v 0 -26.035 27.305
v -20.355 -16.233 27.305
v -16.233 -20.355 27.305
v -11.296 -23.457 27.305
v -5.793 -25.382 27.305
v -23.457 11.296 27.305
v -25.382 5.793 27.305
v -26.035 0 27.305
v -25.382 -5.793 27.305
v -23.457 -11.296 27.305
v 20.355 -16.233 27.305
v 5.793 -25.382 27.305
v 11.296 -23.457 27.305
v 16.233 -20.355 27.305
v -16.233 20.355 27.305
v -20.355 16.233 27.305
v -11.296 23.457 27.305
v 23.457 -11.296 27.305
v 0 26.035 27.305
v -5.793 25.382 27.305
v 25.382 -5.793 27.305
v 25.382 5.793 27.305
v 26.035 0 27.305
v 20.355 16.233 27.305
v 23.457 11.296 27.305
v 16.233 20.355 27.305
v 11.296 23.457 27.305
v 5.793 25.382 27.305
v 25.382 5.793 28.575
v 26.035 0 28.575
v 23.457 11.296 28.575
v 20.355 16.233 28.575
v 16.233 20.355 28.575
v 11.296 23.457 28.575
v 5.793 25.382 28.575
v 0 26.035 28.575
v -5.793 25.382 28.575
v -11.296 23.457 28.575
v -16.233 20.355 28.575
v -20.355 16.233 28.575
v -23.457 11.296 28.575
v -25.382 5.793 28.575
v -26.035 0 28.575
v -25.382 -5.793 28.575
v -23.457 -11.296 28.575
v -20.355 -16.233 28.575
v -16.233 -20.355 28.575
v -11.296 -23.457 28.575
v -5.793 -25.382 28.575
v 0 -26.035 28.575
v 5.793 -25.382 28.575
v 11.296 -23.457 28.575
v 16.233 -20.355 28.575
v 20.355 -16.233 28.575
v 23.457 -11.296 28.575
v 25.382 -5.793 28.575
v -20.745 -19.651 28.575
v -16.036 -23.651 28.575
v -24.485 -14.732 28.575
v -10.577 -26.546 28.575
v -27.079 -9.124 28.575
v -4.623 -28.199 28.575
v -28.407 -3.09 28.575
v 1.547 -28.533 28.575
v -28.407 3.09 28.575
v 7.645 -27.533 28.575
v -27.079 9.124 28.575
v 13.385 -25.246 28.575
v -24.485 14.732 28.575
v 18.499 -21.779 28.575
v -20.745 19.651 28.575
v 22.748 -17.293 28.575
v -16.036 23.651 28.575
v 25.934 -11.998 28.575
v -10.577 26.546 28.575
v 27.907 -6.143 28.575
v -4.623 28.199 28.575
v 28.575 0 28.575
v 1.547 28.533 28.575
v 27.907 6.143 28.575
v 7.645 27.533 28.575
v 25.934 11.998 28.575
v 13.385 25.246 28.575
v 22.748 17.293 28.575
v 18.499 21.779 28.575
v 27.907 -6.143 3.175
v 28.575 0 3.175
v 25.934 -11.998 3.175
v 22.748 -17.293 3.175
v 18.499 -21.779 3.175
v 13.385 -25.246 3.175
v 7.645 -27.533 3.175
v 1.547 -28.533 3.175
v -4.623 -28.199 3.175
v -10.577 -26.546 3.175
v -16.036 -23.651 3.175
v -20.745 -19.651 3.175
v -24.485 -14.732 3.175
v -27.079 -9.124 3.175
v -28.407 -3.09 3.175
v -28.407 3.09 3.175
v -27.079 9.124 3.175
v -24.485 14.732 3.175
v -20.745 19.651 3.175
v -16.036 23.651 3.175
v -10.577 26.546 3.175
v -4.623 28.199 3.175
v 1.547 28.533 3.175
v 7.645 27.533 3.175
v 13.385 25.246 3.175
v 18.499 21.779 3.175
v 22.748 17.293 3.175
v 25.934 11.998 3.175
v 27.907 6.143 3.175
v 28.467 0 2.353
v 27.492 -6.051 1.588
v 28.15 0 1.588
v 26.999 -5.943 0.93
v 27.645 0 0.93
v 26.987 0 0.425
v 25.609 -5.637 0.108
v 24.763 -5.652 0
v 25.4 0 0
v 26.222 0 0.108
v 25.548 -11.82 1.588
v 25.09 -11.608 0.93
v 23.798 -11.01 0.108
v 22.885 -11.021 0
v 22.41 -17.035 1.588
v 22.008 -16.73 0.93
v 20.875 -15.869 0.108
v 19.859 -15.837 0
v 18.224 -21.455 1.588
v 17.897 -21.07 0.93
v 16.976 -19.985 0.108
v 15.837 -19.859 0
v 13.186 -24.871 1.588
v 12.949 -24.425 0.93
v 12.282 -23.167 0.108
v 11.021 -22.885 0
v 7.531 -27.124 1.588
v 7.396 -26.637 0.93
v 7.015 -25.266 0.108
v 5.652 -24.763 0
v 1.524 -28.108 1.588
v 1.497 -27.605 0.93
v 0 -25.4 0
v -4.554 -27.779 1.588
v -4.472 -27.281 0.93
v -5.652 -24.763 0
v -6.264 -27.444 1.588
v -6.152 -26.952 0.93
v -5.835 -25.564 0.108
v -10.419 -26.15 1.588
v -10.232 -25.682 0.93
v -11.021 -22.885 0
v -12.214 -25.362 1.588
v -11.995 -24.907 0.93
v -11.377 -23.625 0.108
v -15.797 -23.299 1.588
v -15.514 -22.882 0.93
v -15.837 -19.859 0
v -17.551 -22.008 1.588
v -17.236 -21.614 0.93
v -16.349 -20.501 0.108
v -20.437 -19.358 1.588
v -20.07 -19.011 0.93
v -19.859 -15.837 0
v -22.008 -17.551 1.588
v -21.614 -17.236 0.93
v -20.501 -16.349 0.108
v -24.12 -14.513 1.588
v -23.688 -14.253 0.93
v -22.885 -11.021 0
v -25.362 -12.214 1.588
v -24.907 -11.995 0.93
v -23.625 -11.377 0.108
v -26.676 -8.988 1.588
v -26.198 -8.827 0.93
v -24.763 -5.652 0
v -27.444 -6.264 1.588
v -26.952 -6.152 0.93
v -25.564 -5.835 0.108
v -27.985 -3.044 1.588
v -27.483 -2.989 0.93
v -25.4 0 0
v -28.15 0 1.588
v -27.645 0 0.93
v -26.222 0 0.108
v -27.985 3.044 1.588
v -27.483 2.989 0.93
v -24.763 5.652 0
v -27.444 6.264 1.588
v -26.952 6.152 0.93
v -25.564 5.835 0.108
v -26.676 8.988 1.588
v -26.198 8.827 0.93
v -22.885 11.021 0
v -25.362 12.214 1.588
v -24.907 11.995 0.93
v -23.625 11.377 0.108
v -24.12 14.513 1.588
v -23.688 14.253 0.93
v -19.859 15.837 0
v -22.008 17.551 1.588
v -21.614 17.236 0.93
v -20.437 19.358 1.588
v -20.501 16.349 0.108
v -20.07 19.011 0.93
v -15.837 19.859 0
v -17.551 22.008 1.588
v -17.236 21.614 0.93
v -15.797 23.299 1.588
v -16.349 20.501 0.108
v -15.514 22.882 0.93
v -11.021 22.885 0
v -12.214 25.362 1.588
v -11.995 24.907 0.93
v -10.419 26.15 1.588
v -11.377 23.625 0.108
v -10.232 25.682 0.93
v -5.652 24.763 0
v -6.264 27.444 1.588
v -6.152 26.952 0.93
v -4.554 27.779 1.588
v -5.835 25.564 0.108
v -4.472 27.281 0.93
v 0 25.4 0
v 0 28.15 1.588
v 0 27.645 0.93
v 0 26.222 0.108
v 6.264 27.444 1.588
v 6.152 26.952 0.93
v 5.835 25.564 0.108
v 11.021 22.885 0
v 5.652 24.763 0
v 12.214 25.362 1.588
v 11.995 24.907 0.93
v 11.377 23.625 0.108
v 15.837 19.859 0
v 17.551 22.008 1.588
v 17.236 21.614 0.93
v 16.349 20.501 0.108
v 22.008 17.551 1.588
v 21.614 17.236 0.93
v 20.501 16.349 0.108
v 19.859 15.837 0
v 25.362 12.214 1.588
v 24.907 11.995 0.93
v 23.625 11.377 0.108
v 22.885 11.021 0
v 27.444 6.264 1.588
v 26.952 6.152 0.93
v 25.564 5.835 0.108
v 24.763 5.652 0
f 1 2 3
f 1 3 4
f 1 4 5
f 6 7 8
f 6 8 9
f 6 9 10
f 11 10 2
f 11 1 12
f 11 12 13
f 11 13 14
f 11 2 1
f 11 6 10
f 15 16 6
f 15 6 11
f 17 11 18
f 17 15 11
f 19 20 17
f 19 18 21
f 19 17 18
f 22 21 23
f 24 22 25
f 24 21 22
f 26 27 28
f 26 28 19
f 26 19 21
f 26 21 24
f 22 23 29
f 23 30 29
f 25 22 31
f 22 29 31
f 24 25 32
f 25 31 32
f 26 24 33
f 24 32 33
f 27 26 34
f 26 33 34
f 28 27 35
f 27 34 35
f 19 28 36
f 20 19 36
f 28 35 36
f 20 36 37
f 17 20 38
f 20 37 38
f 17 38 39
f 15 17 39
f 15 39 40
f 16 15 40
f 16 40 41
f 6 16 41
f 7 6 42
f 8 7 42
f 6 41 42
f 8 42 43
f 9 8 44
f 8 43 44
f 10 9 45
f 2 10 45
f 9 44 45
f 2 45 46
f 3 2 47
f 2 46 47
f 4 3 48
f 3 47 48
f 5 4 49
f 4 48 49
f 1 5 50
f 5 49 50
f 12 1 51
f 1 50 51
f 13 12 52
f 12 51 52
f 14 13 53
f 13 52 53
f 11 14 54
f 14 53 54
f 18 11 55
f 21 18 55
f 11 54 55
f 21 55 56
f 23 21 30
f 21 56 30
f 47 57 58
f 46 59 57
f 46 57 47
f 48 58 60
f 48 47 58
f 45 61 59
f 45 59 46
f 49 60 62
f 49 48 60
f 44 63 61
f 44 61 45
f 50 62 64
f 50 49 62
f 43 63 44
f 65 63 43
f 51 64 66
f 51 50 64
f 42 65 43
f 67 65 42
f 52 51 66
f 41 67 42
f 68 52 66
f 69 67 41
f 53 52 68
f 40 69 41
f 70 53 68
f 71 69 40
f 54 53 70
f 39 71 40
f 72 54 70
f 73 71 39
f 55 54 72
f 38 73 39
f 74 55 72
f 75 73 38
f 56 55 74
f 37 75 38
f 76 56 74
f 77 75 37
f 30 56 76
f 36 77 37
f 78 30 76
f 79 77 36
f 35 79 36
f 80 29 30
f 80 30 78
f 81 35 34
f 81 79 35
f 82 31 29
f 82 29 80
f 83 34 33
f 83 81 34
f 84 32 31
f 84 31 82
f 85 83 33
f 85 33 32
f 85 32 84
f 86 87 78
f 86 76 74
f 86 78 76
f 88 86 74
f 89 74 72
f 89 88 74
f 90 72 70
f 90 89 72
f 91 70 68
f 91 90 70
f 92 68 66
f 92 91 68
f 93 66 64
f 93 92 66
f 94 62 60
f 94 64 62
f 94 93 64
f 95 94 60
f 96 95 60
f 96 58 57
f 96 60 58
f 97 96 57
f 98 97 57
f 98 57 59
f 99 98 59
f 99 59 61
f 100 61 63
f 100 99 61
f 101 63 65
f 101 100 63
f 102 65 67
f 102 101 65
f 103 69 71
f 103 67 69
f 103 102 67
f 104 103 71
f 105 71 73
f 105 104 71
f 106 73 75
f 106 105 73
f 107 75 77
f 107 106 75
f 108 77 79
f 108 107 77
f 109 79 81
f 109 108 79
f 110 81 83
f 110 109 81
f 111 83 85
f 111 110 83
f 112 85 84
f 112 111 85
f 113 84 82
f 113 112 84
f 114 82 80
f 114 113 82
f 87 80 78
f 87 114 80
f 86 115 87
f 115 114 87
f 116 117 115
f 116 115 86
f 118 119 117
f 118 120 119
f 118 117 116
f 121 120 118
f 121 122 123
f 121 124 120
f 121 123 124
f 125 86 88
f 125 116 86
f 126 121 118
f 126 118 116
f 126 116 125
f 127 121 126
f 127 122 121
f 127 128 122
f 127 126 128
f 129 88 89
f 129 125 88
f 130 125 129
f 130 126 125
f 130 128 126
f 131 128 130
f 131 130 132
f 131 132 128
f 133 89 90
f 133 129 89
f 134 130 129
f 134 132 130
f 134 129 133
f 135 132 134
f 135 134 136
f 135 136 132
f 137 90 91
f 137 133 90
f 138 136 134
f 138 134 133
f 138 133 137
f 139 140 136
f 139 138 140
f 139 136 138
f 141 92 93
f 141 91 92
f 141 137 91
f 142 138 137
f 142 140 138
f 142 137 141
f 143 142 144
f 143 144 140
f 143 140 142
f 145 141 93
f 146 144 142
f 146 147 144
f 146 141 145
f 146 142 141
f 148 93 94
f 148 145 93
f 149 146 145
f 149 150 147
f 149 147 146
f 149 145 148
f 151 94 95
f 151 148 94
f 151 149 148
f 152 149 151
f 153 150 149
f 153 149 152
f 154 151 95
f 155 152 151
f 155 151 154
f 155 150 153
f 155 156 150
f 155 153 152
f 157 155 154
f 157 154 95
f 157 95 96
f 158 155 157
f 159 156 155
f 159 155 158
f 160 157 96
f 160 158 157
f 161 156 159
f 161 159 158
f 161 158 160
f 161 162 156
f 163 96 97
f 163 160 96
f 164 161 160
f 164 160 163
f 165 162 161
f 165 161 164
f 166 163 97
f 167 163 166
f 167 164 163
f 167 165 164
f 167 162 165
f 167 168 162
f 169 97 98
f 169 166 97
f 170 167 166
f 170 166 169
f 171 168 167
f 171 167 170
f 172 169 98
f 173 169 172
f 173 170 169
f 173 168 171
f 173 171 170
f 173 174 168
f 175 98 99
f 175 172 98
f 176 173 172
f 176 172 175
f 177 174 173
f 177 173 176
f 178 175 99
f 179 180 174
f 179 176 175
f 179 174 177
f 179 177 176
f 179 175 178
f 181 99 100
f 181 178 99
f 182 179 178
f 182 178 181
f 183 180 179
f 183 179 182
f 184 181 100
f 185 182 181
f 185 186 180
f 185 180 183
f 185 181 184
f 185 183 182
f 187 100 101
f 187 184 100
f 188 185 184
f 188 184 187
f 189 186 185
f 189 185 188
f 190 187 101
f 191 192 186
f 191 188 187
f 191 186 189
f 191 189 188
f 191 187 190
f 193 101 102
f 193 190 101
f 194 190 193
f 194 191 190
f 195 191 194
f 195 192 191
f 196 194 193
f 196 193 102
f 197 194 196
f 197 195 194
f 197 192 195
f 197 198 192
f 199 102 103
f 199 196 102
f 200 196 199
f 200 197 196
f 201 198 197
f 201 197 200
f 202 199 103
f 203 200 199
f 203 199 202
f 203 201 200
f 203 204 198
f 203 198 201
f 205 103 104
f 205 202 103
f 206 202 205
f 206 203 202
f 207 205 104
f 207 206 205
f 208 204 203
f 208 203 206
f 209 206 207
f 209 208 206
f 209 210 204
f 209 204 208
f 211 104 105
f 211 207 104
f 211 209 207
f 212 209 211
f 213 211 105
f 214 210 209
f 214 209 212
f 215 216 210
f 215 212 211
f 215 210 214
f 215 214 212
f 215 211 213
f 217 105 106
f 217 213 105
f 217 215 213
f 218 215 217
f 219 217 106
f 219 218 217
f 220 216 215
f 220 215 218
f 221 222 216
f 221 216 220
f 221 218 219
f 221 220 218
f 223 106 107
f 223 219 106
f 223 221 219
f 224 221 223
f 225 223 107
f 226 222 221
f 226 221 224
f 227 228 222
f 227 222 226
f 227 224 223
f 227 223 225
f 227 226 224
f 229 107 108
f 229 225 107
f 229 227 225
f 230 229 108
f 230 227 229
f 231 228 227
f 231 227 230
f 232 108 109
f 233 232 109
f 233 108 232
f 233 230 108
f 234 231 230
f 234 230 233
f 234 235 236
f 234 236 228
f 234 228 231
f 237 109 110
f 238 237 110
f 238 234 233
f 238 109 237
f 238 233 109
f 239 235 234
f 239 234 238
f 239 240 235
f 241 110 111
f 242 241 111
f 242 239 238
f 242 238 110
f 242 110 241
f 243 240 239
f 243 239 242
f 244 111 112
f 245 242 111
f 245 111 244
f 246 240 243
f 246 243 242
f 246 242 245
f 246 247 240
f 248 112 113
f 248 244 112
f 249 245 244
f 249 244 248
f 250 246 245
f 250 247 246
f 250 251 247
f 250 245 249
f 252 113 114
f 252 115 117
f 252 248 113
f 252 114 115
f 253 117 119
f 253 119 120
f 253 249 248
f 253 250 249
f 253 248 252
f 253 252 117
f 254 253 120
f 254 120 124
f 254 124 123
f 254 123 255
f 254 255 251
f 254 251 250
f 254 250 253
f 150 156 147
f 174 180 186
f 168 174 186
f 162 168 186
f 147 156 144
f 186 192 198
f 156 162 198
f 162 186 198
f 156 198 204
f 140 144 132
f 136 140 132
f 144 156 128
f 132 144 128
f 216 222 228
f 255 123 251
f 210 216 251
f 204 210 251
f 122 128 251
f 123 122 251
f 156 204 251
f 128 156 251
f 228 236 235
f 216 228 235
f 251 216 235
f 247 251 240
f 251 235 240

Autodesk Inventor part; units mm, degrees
ref_plane "YZ Plane" through (0, 0, 0) normal (1, 0, 0) x (0, 1, 0)
ref_plane "XZ Plane" through (0, 0, 0) normal (0, 1, 0) x (-1, 0, 0)
ref_plane "XY Plane" through (0, 0, 0) normal (0, 0, 1) x (1, 0, 0)
sketch "Sketch1" plane through (0, 0, 0) normal (0, 0, 1) x (1, 0, 0)
  circle A0 centre (0, 0) radius 28.575
  dimension "d0" = 57.15
extrude "Extrusion1" add sketch "Sketch1" along normal blind 28.575
sketch "Sketch2" plane through (0, 0, 28.575) normal (0, 0, 1) x (1, 0, 0)
  circle A0 centre (0, 0) radius 28.575 projected
  circle A1 centre (0, 0) radius 26.035
  dimension "d4" = 52.07
extrude "Extrusion2" cut sketch "Sketch2" against normal blind 1.27 contours A1
fillet "Fillet1" radius 3.175 1 edges at (-28.575, 0, 0)
properties part number "Lg Motor Bottom" material "ABS Plastic"
